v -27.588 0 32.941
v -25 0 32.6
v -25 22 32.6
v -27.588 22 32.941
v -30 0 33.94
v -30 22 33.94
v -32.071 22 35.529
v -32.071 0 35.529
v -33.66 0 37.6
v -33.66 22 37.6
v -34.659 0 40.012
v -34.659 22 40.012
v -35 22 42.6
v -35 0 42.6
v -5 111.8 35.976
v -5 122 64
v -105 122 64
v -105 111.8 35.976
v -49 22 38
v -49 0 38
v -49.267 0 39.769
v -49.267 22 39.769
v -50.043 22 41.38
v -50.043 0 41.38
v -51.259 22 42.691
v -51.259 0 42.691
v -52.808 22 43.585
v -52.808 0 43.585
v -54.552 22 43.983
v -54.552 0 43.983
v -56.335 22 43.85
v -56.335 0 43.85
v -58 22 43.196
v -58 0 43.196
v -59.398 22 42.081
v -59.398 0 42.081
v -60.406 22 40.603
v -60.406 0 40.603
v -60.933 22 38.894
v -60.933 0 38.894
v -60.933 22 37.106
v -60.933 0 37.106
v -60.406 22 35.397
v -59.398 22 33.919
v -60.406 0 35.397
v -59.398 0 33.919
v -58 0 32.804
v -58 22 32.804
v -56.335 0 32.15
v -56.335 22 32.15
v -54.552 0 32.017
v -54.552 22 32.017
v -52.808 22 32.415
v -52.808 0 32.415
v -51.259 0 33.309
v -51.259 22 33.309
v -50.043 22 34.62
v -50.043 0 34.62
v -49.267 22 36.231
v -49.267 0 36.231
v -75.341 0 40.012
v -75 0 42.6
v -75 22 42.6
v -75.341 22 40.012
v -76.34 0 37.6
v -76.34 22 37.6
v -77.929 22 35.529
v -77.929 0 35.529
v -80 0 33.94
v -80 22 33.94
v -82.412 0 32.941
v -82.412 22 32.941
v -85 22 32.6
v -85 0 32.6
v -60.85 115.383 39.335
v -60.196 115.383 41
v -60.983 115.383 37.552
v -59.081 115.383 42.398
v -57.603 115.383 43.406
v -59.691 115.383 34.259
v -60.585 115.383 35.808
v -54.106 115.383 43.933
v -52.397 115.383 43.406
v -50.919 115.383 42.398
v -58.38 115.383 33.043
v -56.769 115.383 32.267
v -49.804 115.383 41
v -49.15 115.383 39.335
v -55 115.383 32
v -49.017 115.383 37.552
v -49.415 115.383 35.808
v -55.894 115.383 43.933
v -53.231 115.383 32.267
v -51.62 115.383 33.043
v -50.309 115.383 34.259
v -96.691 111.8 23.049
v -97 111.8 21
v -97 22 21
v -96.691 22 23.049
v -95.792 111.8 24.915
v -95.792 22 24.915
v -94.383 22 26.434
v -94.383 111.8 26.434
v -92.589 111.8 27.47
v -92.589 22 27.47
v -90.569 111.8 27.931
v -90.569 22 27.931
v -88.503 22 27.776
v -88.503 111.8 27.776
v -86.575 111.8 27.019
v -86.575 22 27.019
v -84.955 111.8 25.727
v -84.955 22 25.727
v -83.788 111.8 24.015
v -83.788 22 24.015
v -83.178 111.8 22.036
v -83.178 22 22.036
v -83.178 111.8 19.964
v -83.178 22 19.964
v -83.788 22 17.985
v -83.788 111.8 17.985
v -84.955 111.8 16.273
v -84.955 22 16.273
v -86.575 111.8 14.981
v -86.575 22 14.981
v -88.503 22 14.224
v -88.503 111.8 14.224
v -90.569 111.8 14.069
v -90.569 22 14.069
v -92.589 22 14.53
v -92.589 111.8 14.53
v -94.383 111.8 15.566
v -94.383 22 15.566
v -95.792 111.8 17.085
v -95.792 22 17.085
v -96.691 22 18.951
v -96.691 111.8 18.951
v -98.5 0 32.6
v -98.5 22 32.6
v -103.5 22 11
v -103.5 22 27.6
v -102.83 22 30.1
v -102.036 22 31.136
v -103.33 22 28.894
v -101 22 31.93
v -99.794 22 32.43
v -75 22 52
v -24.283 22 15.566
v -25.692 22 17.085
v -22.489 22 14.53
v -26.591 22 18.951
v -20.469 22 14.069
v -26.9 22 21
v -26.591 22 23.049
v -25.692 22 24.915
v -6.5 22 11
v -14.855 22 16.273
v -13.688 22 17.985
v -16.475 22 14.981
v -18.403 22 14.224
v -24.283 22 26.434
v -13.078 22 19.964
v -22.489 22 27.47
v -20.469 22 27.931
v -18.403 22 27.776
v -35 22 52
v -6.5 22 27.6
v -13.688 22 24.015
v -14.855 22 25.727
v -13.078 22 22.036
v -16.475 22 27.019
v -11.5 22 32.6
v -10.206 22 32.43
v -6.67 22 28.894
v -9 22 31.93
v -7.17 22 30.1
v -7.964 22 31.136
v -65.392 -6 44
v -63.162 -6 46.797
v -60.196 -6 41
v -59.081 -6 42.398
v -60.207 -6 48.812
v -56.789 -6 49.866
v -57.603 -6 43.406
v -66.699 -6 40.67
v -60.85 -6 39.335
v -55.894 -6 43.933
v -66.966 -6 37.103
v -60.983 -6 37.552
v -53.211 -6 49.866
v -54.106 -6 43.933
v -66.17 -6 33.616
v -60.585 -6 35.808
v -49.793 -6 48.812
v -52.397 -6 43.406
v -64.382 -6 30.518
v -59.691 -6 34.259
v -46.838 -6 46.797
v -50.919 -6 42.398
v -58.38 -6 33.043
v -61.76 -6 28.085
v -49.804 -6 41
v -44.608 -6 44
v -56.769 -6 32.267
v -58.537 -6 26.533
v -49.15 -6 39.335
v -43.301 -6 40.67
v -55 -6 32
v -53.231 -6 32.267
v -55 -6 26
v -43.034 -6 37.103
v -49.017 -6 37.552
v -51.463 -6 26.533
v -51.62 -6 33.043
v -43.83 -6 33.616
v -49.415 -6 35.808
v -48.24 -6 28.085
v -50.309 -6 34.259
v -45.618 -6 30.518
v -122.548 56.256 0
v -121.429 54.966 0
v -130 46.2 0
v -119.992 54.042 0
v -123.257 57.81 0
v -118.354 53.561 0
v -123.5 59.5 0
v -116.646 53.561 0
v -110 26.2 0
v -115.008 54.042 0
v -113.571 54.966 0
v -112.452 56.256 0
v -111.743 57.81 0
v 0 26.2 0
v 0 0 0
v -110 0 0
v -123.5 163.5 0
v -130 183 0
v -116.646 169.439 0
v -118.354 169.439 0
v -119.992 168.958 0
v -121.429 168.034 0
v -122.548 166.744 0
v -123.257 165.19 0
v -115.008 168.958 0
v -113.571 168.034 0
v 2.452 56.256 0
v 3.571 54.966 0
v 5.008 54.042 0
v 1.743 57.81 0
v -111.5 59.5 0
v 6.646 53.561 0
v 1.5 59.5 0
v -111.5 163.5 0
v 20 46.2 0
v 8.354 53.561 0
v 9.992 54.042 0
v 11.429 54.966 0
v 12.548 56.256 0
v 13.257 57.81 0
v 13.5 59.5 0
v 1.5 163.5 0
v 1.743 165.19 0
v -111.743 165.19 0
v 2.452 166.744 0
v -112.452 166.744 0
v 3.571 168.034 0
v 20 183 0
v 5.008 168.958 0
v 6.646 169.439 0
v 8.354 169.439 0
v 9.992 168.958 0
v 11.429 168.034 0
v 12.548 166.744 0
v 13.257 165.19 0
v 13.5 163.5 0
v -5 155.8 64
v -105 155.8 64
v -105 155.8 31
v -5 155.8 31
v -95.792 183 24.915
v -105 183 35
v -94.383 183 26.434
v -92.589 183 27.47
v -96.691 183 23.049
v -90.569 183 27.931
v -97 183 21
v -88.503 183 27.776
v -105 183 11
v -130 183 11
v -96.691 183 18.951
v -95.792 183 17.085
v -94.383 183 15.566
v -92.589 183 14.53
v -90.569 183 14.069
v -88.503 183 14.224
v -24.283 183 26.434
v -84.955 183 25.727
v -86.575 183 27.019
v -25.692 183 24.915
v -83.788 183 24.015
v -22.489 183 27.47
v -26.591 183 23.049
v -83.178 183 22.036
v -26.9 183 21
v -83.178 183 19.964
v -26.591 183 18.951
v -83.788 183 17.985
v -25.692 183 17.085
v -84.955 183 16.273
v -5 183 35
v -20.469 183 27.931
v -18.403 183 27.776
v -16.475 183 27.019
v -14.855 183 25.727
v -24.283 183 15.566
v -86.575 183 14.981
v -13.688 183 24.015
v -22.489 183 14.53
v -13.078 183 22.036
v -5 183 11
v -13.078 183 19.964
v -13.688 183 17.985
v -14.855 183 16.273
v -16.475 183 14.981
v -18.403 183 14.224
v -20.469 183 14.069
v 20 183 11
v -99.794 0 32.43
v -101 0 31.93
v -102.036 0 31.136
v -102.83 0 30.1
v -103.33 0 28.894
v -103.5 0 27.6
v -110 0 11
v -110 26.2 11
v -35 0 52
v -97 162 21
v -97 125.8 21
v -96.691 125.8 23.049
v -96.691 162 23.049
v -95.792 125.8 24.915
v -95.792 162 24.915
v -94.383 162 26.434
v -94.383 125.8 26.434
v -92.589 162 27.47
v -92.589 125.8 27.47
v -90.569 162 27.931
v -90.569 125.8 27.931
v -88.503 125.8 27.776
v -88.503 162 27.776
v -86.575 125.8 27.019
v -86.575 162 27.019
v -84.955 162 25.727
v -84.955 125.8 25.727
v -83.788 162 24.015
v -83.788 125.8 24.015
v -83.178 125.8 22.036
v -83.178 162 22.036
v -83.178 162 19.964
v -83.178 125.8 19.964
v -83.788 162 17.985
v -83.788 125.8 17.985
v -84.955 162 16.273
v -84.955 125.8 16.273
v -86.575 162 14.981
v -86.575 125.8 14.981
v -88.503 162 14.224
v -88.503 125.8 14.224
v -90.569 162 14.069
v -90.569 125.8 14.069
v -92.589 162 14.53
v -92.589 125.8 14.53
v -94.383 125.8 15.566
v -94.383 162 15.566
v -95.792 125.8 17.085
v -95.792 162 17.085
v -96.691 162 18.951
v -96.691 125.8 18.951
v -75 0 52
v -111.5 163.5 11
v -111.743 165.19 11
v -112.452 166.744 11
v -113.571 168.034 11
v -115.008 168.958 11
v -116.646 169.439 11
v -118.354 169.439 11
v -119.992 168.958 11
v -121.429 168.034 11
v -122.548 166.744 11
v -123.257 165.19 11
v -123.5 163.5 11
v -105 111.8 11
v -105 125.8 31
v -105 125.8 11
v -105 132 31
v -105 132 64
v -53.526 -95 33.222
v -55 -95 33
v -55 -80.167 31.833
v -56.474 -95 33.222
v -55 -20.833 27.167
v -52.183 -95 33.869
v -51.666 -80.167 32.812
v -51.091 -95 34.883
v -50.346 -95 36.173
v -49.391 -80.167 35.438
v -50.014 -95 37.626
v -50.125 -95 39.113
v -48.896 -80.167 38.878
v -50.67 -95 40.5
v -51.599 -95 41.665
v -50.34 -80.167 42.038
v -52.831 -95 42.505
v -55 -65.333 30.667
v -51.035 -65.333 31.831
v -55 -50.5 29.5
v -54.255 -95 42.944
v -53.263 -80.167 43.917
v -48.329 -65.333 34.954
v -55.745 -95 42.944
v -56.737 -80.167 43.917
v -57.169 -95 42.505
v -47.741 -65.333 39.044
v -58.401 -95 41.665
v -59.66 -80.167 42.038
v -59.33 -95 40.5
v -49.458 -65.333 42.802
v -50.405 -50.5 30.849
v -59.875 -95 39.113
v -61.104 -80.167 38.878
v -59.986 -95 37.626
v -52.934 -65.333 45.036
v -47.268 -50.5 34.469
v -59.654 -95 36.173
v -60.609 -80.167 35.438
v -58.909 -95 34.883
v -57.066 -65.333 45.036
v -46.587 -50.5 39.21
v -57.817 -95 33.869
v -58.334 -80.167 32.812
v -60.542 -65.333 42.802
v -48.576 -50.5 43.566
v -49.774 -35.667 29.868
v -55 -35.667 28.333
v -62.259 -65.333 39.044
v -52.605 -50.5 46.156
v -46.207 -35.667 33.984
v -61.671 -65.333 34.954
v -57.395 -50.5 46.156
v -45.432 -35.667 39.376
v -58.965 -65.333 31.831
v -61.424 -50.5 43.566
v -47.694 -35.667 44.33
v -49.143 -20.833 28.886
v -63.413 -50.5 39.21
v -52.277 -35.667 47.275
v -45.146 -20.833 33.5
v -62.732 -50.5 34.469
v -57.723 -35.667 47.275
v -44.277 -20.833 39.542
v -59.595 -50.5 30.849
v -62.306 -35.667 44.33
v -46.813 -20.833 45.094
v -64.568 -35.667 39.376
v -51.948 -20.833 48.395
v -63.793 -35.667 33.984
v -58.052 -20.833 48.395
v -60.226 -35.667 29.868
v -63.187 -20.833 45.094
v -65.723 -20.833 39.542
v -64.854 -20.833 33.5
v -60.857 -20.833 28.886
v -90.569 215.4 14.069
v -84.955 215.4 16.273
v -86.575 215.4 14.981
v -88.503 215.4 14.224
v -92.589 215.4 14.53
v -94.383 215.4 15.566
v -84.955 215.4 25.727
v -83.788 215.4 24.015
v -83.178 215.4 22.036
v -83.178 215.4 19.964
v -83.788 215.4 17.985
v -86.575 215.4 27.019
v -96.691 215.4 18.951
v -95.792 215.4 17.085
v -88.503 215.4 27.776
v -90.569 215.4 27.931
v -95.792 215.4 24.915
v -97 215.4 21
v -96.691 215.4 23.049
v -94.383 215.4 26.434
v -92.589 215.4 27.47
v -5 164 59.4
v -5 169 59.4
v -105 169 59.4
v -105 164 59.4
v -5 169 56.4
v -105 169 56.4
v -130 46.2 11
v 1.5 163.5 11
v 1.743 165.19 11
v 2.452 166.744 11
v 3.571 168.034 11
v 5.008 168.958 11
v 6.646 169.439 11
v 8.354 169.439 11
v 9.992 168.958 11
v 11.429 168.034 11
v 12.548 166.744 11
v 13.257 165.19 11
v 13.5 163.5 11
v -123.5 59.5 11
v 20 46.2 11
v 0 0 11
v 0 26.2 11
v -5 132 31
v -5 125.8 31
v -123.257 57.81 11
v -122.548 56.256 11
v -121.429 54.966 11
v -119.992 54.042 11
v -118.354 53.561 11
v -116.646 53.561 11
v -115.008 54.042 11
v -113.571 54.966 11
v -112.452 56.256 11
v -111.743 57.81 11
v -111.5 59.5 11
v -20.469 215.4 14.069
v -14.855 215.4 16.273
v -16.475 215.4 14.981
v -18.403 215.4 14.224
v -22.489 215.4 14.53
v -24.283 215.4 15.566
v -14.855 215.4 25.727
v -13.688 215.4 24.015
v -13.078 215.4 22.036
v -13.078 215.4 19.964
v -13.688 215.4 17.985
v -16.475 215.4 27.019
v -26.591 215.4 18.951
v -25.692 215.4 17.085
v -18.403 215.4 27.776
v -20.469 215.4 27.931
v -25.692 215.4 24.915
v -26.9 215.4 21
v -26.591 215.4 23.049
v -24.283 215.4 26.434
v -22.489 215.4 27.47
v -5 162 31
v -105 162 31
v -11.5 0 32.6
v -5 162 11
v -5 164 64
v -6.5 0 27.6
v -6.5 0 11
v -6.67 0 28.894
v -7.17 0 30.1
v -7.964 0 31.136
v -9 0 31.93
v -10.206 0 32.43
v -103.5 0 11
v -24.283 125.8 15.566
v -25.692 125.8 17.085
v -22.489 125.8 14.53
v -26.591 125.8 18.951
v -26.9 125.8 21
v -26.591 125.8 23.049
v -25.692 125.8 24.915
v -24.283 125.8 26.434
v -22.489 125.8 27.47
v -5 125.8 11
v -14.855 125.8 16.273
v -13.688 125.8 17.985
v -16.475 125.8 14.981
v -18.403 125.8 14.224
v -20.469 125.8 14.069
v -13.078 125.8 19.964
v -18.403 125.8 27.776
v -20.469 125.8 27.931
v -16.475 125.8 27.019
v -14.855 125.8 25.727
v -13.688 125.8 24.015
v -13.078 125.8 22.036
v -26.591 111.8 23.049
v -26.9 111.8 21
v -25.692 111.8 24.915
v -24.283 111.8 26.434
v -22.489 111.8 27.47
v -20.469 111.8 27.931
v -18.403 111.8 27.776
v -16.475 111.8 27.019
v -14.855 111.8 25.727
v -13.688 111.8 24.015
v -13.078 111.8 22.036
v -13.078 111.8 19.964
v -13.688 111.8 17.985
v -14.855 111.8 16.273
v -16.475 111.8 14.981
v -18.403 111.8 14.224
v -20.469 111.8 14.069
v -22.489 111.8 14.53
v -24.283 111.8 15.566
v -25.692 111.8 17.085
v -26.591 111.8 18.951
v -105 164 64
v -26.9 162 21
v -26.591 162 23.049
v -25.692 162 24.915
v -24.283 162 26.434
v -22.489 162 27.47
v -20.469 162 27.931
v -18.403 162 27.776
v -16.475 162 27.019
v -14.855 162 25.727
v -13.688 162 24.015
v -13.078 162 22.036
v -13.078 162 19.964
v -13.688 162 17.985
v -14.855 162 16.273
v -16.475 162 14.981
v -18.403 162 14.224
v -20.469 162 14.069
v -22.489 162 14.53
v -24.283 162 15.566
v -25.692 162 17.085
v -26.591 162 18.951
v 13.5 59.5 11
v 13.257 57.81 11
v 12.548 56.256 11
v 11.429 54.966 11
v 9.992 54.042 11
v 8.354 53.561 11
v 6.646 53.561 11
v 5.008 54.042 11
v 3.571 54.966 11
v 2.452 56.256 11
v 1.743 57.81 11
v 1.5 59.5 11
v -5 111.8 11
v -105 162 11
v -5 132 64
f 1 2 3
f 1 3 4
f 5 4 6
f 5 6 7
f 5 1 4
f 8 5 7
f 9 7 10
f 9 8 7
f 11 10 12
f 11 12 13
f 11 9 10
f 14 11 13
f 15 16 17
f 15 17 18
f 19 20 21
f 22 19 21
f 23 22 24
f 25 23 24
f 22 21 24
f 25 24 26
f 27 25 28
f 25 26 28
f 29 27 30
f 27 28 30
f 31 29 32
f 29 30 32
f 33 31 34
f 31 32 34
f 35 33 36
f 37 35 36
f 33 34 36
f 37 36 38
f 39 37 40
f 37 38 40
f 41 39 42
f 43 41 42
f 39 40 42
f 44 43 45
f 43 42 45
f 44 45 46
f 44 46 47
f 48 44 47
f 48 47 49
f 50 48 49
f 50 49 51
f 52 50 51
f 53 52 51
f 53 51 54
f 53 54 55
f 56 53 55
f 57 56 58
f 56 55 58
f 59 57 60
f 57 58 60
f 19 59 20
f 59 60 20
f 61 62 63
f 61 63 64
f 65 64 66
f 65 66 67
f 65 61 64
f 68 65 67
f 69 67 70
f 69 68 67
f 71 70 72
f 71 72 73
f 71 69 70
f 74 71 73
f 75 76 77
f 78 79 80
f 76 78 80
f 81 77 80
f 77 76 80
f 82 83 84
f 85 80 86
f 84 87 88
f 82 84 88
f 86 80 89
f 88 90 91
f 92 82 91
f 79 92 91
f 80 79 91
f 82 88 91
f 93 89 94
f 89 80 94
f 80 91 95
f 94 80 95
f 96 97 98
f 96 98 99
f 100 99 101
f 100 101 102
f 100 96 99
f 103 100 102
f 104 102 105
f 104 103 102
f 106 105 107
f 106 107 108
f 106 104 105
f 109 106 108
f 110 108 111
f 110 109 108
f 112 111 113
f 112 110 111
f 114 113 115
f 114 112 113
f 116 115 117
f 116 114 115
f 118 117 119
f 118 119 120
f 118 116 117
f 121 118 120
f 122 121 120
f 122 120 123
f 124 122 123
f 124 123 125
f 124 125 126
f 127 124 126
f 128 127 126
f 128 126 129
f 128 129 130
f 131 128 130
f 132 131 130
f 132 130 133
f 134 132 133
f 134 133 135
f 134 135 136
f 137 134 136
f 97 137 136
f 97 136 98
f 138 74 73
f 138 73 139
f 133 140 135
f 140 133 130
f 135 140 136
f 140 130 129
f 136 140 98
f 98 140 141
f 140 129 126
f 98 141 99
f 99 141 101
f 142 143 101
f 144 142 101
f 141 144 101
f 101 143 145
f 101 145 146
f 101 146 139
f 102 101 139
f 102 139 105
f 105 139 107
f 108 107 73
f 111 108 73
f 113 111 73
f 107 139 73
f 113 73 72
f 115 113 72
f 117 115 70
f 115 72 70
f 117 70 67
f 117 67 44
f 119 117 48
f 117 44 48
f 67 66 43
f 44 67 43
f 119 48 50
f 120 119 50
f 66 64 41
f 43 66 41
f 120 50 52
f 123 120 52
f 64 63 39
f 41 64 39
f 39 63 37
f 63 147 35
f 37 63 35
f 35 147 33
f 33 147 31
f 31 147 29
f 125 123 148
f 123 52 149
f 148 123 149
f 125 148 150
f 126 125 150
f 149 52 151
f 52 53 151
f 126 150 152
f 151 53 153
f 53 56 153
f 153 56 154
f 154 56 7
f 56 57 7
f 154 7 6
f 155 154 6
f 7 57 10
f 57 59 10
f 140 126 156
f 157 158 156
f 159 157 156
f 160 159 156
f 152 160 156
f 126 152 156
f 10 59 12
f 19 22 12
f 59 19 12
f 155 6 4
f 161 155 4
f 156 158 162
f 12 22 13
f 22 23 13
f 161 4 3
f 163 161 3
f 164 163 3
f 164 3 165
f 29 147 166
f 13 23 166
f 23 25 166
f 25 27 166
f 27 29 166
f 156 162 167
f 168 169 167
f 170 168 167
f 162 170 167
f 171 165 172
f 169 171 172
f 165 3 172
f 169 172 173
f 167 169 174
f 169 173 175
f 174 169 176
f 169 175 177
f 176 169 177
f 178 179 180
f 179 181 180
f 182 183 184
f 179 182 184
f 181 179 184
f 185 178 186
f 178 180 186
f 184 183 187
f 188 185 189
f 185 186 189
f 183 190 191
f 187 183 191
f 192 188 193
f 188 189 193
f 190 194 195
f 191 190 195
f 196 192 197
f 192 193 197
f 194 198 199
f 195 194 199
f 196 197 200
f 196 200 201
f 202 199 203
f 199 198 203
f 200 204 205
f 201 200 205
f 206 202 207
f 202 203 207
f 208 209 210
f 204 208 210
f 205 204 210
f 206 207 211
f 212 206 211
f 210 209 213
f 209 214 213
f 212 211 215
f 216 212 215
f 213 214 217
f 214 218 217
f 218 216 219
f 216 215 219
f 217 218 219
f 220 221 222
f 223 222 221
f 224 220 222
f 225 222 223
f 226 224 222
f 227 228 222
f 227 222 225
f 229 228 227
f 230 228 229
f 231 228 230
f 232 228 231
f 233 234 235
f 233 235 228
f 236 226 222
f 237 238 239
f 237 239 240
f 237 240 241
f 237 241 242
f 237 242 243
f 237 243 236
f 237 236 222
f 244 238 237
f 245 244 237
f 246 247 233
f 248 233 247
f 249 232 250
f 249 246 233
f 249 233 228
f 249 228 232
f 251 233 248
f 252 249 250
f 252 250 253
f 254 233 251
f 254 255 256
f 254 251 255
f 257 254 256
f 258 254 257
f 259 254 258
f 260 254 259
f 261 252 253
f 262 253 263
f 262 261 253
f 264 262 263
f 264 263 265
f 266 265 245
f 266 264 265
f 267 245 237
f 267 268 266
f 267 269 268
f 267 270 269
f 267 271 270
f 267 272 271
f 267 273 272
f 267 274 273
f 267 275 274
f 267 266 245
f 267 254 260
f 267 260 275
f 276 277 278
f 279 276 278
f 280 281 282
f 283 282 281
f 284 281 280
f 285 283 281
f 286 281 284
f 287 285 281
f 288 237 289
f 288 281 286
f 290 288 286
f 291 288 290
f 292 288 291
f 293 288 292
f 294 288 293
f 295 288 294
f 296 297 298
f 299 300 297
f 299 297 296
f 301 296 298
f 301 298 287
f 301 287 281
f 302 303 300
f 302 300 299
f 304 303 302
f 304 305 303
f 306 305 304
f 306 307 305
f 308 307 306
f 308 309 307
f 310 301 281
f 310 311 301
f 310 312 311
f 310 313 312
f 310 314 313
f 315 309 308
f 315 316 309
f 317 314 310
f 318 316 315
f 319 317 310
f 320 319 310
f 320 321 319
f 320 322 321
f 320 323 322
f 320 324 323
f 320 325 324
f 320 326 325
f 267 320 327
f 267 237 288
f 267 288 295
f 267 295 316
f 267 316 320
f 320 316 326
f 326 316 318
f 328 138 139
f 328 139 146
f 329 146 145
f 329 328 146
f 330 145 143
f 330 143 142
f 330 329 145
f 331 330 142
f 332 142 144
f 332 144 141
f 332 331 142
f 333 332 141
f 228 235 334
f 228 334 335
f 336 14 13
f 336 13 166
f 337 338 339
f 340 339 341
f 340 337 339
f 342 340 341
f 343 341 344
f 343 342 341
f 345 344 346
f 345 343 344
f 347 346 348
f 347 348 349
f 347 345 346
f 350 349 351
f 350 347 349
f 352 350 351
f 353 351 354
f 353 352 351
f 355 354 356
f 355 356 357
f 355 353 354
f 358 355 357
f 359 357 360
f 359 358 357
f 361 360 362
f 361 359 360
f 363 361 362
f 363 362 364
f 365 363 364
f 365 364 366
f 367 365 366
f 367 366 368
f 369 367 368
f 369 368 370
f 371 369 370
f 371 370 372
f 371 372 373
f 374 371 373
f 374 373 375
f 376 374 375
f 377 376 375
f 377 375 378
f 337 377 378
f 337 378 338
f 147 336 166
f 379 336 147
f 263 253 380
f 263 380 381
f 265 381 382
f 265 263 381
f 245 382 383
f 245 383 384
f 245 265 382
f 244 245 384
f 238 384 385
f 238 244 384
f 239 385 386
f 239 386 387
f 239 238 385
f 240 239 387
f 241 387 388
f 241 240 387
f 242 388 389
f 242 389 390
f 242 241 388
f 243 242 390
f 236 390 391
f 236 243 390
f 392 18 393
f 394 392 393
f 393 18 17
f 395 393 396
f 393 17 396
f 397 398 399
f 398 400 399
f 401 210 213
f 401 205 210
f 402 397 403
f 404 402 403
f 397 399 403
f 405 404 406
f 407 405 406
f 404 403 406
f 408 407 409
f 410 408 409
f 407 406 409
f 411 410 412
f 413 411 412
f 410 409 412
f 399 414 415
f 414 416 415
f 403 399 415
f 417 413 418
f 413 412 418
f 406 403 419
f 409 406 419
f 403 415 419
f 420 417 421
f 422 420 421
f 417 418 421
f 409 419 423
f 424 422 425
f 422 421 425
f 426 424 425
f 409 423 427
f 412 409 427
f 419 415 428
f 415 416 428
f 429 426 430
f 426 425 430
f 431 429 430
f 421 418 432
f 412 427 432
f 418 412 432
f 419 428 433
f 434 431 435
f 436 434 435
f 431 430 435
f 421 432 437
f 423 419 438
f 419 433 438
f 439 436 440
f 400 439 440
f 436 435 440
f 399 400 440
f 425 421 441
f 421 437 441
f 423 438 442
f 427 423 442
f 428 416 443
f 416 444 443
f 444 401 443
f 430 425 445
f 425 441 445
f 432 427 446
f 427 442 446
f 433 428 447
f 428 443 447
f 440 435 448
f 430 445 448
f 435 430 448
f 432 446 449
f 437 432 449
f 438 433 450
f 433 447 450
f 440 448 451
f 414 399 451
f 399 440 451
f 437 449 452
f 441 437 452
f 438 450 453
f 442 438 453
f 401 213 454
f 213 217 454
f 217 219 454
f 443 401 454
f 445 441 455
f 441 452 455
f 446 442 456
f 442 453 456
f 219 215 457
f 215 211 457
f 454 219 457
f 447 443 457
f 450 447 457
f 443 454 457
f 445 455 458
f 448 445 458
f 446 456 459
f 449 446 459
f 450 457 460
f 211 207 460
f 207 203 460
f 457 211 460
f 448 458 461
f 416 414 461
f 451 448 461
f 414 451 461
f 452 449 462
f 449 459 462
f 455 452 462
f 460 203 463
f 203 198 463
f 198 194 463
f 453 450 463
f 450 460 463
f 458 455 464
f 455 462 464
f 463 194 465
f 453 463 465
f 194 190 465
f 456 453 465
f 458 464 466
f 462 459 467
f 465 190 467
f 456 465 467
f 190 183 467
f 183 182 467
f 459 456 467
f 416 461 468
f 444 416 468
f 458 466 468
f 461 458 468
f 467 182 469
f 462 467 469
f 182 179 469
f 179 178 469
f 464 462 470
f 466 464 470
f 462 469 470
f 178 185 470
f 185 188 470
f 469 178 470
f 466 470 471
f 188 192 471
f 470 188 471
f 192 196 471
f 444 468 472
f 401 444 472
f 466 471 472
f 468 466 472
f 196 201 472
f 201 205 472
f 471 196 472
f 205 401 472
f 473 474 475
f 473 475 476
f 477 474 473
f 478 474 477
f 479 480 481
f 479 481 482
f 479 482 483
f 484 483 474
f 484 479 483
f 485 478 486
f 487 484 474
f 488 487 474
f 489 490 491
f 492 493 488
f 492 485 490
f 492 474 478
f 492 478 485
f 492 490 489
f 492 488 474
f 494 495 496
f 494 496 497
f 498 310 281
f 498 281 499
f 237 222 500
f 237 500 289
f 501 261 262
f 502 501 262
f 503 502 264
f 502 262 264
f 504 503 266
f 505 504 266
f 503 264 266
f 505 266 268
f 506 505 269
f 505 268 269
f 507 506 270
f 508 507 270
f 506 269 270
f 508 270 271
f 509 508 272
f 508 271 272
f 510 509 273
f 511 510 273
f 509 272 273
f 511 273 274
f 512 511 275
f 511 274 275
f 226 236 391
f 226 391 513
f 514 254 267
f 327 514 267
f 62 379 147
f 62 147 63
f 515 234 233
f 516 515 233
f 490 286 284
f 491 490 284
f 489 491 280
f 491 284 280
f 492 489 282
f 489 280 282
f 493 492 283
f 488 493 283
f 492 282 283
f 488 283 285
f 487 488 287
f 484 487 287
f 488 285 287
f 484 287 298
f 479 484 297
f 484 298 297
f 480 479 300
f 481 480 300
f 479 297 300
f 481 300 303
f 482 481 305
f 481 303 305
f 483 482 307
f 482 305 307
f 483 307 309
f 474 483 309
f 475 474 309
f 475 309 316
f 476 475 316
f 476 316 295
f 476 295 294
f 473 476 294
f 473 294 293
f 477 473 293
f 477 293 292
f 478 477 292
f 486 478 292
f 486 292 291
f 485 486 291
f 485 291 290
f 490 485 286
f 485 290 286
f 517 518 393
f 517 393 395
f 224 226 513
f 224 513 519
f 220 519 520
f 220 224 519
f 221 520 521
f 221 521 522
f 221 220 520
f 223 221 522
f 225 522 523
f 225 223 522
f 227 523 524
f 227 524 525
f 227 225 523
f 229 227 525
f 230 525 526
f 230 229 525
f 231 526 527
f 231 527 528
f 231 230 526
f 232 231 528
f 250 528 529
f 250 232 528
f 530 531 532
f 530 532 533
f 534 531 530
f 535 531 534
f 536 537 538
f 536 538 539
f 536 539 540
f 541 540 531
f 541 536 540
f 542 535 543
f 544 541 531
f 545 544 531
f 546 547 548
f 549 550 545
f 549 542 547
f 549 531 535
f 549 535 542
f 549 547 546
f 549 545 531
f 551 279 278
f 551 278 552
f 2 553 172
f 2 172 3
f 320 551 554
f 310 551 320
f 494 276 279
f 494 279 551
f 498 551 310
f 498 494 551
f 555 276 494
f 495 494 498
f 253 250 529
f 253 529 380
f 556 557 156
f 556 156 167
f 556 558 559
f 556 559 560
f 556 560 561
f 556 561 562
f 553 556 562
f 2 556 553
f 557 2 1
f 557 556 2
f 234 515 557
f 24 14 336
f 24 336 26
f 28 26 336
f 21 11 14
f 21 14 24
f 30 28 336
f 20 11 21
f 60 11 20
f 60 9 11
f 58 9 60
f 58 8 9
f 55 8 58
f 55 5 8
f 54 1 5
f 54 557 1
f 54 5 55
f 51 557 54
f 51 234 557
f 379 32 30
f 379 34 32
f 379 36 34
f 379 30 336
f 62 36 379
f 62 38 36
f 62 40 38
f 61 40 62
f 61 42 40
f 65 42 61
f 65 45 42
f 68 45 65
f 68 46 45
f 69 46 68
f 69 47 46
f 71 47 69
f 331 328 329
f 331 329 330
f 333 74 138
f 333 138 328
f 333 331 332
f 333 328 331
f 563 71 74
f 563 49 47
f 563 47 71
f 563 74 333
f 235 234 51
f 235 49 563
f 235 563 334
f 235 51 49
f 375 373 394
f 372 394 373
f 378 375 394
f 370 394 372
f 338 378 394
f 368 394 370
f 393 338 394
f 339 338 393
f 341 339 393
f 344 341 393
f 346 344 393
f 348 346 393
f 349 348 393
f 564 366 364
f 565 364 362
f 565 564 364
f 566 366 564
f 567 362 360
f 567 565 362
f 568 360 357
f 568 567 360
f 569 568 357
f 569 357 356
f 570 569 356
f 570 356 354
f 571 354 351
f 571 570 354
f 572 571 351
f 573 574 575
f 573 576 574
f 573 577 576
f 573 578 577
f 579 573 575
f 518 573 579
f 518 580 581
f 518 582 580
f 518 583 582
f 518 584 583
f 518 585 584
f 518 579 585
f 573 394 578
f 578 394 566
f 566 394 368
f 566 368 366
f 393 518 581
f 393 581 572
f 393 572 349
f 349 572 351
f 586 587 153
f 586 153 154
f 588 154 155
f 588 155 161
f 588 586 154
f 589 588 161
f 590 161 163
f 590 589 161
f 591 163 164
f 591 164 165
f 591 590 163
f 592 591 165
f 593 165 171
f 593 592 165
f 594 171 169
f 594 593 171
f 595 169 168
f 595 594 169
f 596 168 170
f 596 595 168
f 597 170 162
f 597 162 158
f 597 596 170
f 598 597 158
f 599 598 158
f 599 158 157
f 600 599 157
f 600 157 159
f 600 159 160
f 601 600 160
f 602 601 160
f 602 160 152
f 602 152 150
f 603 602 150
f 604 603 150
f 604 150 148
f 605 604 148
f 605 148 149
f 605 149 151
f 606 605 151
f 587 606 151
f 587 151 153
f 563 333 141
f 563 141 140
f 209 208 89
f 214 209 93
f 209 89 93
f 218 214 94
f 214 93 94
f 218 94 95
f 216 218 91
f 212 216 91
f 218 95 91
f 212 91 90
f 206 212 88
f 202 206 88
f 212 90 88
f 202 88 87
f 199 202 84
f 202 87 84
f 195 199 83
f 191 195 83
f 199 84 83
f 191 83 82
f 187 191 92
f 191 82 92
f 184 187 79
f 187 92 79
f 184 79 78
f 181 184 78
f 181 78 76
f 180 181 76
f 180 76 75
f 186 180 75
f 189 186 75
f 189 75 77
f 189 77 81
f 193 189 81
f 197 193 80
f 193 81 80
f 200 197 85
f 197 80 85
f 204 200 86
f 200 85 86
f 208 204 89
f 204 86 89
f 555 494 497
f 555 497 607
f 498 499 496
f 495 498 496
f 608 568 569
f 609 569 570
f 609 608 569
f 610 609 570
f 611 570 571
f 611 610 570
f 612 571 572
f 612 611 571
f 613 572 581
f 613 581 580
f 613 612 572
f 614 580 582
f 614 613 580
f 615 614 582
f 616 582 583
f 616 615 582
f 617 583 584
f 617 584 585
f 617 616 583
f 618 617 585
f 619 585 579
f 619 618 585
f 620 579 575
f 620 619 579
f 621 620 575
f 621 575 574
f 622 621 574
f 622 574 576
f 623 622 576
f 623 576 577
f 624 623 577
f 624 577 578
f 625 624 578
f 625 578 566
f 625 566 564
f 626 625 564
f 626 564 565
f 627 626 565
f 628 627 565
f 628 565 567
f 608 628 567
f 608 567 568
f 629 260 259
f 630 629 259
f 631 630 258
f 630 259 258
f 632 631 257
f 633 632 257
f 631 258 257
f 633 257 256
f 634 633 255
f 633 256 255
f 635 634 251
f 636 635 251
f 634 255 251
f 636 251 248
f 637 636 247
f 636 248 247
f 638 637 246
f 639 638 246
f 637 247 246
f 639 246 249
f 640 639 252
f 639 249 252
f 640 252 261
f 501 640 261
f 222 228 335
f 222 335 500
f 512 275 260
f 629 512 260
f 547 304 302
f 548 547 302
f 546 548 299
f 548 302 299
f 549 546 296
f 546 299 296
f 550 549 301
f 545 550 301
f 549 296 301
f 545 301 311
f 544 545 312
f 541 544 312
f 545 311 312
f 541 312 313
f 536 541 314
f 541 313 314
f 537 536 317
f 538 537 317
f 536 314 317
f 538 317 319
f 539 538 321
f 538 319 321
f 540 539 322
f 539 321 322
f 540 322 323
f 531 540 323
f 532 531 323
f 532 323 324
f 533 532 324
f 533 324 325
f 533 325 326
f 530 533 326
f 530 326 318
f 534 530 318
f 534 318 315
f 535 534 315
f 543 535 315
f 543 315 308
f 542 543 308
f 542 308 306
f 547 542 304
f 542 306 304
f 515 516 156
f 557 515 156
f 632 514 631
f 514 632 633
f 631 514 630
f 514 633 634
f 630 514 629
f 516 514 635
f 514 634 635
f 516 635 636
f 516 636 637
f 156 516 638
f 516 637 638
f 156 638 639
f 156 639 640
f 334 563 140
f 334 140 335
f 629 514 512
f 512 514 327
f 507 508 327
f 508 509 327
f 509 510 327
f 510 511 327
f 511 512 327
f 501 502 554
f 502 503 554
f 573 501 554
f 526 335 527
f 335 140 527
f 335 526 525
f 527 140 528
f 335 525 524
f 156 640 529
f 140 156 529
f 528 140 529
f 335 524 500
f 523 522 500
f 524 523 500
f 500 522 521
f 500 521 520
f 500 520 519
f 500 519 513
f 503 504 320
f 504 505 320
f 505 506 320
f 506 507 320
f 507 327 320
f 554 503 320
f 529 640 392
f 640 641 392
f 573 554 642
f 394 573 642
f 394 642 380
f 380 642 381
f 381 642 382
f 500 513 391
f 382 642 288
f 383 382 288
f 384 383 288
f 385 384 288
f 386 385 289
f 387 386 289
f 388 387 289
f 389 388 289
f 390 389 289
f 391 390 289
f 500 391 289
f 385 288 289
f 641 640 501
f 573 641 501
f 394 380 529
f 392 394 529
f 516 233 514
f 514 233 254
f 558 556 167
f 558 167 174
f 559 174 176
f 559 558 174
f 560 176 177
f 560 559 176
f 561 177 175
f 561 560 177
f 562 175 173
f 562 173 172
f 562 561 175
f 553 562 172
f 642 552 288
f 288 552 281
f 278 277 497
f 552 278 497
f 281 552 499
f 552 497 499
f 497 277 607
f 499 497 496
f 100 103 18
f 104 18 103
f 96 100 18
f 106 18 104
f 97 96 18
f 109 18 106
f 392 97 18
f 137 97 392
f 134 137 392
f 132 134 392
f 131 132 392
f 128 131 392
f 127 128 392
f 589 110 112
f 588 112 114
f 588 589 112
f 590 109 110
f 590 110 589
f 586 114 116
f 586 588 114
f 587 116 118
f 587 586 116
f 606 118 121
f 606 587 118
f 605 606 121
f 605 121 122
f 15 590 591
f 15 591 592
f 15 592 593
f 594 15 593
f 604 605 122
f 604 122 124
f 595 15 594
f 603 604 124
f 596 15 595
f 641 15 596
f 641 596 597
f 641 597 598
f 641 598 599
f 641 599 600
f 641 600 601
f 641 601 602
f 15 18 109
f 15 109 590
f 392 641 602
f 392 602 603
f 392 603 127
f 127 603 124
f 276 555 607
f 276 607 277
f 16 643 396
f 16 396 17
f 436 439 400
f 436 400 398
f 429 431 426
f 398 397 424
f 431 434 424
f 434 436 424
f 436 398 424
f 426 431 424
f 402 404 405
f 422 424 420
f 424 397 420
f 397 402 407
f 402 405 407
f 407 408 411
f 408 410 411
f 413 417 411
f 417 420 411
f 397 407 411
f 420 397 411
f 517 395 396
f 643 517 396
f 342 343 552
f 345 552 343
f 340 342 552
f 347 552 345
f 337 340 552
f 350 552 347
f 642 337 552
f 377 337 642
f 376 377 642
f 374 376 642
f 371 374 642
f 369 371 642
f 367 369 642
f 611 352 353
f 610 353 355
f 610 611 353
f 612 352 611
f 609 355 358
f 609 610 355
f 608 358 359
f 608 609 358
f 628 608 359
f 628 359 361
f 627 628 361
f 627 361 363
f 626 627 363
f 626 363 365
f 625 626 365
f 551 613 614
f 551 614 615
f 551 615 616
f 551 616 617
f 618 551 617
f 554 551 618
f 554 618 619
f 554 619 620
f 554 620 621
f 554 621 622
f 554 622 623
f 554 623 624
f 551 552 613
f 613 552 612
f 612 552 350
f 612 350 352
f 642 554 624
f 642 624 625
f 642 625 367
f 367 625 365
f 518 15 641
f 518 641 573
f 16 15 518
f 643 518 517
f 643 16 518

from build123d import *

# Parameters (mm, degrees)
F1_DEPTH  = 11
F3_R      = 6
F4_DEPTH  = 22
F7_DEPTH  = 100
F8_R      = 6.95
F9_DEPTH  = 32.4
F10_DEPTH = 183
F12_W     = 115.383207798
F12_H     = 6
F15_DEPTH = 100


with BuildPart() as f1:
    # F0 (on Top) → F1 (new body)
    with BuildSketch(Plane.XY):
        Polygon((-55, 0), (0, 0), (0, 26.2), (20, 46.2), (20, 183), (-55, 183), align=None)
        with BuildLine():
            Line((13.5, 163.5), (13.5, 59.5))
            ThreePointArc((13.5, 59.5), (7.5, 53.5), (1.5, 59.5))
            Line((1.5, 59.5), (1.5, 163.5))
            ThreePointArc((1.5, 163.5), (7.5, 169.5), (13.5, 163.5))
        make_face(mode=Mode.SUBTRACT)
    extrude(amount=F1_DEPTH)

    # F2: F1 across face


with BuildPart() as f1_1:
    add(f1.part)
    add(f1.part.mirror(Plane(origin=(-55, 91.5, 5.5), x_dir=(0, -1, 0), z_dir=(-1, 0, 0))))

    # F3 (on face) → F4 (join)
    with BuildSketch(Plane.XZ):
        with BuildLine():
            Line((-103.5, 27.6), (-103.5, 11))
            Line((-103.5, 11), (-6.5, 11))
            Line((-6.5, 11), (-6.5, 27.6))
            ThreePointArc((-6.5, 27.6), (-7.9644660941, 31.1355339059), (-11.5, 32.6))
            Line((-11.5, 32.6), (-25, 32.6))
            ThreePointArc((-25, 32.6), (-32.0710678119, 35.5289321881), (-35, 42.6))
            Line((-35, 42.6), (-35, 52))
            Line((-35, 52), (-75, 52))
            Line((-75, 52), (-75, 42.6))
            ThreePointArc((-75, 42.6), (-77.9289321881, 35.5289321881), (-85, 32.6))
            Line((-85, 32.6), (-98.5, 32.6))
            ThreePointArc((-98.5, 32.6), (-102.0355339059, 31.1355339059), (-103.5, 27.6))
        make_face()
        with Locations((-55, 38)):
            Circle(F3_R, mode=Mode.SUBTRACT)
    extrude(amount=-F4_DEPTH)

    # F6 (on offset) → F7 (join)
    with BuildSketch(Plane.YZ.offset(-5)):
        Polygon((162, 0), (183, 0), (183, 35), (169, 56.4), (169, 59.4), (164, 59.4), (164, 64), (155.8, 64), (155.8, 31), (162, 31), align=None)
    extrude(amount=-F7_DEPTH)

    # F8 (on face) → F9 (join)
    with BuildSketch(Plane(origin=(0, 183, 0), x_dir=(-1, 0, 0), z_dir=(0, 1, 0))):
        with Locations((19.95, 21)):
            Circle(F8_R)
        with Locations((90.05, 21)):
            Circle(F8_R)
    extrude(amount=F9_DEPTH)

    # F8 (on face) → F10 (join)
    with BuildSketch(Plane(origin=(0, 183, 0), x_dir=(-1, 0, 0), z_dir=(0, 1, 0))):
        with Locations((19.95, 21)):
            Circle(F8_R)
        with Locations((90.05, 21)):
            Circle(F8_R)
    extrude(amount=-F10_DEPTH)

    # F14 (on face) → F15 (join)
    with BuildSketch(Plane.YZ.offset(-5)):
        Polygon((132, 31), (132, 64), (122, 64), (111.8, 35.9757303216), (111.8, 11), (125.8, 11), (125.8, 31), align=None)
    extrude(amount=-F15_DEPTH)


with BuildPart() as f13:
    # F12 (on offset) → F13 (revolve)
    with BuildSketch(Plane.YZ.offset(-55)):
        Polygon((0, 32), (0, 38), (-95, 38), (-95, 33), (-6, 26), (-6, 32), align=None)
        with Locations((57.691603899, 35)):
            Rectangle(F12_W, F12_H)
    revolve(axis=Axis((-55, -47.5, 38), (0, -1, 0)))


solid = Compound([f1_1.part, f13.part])
